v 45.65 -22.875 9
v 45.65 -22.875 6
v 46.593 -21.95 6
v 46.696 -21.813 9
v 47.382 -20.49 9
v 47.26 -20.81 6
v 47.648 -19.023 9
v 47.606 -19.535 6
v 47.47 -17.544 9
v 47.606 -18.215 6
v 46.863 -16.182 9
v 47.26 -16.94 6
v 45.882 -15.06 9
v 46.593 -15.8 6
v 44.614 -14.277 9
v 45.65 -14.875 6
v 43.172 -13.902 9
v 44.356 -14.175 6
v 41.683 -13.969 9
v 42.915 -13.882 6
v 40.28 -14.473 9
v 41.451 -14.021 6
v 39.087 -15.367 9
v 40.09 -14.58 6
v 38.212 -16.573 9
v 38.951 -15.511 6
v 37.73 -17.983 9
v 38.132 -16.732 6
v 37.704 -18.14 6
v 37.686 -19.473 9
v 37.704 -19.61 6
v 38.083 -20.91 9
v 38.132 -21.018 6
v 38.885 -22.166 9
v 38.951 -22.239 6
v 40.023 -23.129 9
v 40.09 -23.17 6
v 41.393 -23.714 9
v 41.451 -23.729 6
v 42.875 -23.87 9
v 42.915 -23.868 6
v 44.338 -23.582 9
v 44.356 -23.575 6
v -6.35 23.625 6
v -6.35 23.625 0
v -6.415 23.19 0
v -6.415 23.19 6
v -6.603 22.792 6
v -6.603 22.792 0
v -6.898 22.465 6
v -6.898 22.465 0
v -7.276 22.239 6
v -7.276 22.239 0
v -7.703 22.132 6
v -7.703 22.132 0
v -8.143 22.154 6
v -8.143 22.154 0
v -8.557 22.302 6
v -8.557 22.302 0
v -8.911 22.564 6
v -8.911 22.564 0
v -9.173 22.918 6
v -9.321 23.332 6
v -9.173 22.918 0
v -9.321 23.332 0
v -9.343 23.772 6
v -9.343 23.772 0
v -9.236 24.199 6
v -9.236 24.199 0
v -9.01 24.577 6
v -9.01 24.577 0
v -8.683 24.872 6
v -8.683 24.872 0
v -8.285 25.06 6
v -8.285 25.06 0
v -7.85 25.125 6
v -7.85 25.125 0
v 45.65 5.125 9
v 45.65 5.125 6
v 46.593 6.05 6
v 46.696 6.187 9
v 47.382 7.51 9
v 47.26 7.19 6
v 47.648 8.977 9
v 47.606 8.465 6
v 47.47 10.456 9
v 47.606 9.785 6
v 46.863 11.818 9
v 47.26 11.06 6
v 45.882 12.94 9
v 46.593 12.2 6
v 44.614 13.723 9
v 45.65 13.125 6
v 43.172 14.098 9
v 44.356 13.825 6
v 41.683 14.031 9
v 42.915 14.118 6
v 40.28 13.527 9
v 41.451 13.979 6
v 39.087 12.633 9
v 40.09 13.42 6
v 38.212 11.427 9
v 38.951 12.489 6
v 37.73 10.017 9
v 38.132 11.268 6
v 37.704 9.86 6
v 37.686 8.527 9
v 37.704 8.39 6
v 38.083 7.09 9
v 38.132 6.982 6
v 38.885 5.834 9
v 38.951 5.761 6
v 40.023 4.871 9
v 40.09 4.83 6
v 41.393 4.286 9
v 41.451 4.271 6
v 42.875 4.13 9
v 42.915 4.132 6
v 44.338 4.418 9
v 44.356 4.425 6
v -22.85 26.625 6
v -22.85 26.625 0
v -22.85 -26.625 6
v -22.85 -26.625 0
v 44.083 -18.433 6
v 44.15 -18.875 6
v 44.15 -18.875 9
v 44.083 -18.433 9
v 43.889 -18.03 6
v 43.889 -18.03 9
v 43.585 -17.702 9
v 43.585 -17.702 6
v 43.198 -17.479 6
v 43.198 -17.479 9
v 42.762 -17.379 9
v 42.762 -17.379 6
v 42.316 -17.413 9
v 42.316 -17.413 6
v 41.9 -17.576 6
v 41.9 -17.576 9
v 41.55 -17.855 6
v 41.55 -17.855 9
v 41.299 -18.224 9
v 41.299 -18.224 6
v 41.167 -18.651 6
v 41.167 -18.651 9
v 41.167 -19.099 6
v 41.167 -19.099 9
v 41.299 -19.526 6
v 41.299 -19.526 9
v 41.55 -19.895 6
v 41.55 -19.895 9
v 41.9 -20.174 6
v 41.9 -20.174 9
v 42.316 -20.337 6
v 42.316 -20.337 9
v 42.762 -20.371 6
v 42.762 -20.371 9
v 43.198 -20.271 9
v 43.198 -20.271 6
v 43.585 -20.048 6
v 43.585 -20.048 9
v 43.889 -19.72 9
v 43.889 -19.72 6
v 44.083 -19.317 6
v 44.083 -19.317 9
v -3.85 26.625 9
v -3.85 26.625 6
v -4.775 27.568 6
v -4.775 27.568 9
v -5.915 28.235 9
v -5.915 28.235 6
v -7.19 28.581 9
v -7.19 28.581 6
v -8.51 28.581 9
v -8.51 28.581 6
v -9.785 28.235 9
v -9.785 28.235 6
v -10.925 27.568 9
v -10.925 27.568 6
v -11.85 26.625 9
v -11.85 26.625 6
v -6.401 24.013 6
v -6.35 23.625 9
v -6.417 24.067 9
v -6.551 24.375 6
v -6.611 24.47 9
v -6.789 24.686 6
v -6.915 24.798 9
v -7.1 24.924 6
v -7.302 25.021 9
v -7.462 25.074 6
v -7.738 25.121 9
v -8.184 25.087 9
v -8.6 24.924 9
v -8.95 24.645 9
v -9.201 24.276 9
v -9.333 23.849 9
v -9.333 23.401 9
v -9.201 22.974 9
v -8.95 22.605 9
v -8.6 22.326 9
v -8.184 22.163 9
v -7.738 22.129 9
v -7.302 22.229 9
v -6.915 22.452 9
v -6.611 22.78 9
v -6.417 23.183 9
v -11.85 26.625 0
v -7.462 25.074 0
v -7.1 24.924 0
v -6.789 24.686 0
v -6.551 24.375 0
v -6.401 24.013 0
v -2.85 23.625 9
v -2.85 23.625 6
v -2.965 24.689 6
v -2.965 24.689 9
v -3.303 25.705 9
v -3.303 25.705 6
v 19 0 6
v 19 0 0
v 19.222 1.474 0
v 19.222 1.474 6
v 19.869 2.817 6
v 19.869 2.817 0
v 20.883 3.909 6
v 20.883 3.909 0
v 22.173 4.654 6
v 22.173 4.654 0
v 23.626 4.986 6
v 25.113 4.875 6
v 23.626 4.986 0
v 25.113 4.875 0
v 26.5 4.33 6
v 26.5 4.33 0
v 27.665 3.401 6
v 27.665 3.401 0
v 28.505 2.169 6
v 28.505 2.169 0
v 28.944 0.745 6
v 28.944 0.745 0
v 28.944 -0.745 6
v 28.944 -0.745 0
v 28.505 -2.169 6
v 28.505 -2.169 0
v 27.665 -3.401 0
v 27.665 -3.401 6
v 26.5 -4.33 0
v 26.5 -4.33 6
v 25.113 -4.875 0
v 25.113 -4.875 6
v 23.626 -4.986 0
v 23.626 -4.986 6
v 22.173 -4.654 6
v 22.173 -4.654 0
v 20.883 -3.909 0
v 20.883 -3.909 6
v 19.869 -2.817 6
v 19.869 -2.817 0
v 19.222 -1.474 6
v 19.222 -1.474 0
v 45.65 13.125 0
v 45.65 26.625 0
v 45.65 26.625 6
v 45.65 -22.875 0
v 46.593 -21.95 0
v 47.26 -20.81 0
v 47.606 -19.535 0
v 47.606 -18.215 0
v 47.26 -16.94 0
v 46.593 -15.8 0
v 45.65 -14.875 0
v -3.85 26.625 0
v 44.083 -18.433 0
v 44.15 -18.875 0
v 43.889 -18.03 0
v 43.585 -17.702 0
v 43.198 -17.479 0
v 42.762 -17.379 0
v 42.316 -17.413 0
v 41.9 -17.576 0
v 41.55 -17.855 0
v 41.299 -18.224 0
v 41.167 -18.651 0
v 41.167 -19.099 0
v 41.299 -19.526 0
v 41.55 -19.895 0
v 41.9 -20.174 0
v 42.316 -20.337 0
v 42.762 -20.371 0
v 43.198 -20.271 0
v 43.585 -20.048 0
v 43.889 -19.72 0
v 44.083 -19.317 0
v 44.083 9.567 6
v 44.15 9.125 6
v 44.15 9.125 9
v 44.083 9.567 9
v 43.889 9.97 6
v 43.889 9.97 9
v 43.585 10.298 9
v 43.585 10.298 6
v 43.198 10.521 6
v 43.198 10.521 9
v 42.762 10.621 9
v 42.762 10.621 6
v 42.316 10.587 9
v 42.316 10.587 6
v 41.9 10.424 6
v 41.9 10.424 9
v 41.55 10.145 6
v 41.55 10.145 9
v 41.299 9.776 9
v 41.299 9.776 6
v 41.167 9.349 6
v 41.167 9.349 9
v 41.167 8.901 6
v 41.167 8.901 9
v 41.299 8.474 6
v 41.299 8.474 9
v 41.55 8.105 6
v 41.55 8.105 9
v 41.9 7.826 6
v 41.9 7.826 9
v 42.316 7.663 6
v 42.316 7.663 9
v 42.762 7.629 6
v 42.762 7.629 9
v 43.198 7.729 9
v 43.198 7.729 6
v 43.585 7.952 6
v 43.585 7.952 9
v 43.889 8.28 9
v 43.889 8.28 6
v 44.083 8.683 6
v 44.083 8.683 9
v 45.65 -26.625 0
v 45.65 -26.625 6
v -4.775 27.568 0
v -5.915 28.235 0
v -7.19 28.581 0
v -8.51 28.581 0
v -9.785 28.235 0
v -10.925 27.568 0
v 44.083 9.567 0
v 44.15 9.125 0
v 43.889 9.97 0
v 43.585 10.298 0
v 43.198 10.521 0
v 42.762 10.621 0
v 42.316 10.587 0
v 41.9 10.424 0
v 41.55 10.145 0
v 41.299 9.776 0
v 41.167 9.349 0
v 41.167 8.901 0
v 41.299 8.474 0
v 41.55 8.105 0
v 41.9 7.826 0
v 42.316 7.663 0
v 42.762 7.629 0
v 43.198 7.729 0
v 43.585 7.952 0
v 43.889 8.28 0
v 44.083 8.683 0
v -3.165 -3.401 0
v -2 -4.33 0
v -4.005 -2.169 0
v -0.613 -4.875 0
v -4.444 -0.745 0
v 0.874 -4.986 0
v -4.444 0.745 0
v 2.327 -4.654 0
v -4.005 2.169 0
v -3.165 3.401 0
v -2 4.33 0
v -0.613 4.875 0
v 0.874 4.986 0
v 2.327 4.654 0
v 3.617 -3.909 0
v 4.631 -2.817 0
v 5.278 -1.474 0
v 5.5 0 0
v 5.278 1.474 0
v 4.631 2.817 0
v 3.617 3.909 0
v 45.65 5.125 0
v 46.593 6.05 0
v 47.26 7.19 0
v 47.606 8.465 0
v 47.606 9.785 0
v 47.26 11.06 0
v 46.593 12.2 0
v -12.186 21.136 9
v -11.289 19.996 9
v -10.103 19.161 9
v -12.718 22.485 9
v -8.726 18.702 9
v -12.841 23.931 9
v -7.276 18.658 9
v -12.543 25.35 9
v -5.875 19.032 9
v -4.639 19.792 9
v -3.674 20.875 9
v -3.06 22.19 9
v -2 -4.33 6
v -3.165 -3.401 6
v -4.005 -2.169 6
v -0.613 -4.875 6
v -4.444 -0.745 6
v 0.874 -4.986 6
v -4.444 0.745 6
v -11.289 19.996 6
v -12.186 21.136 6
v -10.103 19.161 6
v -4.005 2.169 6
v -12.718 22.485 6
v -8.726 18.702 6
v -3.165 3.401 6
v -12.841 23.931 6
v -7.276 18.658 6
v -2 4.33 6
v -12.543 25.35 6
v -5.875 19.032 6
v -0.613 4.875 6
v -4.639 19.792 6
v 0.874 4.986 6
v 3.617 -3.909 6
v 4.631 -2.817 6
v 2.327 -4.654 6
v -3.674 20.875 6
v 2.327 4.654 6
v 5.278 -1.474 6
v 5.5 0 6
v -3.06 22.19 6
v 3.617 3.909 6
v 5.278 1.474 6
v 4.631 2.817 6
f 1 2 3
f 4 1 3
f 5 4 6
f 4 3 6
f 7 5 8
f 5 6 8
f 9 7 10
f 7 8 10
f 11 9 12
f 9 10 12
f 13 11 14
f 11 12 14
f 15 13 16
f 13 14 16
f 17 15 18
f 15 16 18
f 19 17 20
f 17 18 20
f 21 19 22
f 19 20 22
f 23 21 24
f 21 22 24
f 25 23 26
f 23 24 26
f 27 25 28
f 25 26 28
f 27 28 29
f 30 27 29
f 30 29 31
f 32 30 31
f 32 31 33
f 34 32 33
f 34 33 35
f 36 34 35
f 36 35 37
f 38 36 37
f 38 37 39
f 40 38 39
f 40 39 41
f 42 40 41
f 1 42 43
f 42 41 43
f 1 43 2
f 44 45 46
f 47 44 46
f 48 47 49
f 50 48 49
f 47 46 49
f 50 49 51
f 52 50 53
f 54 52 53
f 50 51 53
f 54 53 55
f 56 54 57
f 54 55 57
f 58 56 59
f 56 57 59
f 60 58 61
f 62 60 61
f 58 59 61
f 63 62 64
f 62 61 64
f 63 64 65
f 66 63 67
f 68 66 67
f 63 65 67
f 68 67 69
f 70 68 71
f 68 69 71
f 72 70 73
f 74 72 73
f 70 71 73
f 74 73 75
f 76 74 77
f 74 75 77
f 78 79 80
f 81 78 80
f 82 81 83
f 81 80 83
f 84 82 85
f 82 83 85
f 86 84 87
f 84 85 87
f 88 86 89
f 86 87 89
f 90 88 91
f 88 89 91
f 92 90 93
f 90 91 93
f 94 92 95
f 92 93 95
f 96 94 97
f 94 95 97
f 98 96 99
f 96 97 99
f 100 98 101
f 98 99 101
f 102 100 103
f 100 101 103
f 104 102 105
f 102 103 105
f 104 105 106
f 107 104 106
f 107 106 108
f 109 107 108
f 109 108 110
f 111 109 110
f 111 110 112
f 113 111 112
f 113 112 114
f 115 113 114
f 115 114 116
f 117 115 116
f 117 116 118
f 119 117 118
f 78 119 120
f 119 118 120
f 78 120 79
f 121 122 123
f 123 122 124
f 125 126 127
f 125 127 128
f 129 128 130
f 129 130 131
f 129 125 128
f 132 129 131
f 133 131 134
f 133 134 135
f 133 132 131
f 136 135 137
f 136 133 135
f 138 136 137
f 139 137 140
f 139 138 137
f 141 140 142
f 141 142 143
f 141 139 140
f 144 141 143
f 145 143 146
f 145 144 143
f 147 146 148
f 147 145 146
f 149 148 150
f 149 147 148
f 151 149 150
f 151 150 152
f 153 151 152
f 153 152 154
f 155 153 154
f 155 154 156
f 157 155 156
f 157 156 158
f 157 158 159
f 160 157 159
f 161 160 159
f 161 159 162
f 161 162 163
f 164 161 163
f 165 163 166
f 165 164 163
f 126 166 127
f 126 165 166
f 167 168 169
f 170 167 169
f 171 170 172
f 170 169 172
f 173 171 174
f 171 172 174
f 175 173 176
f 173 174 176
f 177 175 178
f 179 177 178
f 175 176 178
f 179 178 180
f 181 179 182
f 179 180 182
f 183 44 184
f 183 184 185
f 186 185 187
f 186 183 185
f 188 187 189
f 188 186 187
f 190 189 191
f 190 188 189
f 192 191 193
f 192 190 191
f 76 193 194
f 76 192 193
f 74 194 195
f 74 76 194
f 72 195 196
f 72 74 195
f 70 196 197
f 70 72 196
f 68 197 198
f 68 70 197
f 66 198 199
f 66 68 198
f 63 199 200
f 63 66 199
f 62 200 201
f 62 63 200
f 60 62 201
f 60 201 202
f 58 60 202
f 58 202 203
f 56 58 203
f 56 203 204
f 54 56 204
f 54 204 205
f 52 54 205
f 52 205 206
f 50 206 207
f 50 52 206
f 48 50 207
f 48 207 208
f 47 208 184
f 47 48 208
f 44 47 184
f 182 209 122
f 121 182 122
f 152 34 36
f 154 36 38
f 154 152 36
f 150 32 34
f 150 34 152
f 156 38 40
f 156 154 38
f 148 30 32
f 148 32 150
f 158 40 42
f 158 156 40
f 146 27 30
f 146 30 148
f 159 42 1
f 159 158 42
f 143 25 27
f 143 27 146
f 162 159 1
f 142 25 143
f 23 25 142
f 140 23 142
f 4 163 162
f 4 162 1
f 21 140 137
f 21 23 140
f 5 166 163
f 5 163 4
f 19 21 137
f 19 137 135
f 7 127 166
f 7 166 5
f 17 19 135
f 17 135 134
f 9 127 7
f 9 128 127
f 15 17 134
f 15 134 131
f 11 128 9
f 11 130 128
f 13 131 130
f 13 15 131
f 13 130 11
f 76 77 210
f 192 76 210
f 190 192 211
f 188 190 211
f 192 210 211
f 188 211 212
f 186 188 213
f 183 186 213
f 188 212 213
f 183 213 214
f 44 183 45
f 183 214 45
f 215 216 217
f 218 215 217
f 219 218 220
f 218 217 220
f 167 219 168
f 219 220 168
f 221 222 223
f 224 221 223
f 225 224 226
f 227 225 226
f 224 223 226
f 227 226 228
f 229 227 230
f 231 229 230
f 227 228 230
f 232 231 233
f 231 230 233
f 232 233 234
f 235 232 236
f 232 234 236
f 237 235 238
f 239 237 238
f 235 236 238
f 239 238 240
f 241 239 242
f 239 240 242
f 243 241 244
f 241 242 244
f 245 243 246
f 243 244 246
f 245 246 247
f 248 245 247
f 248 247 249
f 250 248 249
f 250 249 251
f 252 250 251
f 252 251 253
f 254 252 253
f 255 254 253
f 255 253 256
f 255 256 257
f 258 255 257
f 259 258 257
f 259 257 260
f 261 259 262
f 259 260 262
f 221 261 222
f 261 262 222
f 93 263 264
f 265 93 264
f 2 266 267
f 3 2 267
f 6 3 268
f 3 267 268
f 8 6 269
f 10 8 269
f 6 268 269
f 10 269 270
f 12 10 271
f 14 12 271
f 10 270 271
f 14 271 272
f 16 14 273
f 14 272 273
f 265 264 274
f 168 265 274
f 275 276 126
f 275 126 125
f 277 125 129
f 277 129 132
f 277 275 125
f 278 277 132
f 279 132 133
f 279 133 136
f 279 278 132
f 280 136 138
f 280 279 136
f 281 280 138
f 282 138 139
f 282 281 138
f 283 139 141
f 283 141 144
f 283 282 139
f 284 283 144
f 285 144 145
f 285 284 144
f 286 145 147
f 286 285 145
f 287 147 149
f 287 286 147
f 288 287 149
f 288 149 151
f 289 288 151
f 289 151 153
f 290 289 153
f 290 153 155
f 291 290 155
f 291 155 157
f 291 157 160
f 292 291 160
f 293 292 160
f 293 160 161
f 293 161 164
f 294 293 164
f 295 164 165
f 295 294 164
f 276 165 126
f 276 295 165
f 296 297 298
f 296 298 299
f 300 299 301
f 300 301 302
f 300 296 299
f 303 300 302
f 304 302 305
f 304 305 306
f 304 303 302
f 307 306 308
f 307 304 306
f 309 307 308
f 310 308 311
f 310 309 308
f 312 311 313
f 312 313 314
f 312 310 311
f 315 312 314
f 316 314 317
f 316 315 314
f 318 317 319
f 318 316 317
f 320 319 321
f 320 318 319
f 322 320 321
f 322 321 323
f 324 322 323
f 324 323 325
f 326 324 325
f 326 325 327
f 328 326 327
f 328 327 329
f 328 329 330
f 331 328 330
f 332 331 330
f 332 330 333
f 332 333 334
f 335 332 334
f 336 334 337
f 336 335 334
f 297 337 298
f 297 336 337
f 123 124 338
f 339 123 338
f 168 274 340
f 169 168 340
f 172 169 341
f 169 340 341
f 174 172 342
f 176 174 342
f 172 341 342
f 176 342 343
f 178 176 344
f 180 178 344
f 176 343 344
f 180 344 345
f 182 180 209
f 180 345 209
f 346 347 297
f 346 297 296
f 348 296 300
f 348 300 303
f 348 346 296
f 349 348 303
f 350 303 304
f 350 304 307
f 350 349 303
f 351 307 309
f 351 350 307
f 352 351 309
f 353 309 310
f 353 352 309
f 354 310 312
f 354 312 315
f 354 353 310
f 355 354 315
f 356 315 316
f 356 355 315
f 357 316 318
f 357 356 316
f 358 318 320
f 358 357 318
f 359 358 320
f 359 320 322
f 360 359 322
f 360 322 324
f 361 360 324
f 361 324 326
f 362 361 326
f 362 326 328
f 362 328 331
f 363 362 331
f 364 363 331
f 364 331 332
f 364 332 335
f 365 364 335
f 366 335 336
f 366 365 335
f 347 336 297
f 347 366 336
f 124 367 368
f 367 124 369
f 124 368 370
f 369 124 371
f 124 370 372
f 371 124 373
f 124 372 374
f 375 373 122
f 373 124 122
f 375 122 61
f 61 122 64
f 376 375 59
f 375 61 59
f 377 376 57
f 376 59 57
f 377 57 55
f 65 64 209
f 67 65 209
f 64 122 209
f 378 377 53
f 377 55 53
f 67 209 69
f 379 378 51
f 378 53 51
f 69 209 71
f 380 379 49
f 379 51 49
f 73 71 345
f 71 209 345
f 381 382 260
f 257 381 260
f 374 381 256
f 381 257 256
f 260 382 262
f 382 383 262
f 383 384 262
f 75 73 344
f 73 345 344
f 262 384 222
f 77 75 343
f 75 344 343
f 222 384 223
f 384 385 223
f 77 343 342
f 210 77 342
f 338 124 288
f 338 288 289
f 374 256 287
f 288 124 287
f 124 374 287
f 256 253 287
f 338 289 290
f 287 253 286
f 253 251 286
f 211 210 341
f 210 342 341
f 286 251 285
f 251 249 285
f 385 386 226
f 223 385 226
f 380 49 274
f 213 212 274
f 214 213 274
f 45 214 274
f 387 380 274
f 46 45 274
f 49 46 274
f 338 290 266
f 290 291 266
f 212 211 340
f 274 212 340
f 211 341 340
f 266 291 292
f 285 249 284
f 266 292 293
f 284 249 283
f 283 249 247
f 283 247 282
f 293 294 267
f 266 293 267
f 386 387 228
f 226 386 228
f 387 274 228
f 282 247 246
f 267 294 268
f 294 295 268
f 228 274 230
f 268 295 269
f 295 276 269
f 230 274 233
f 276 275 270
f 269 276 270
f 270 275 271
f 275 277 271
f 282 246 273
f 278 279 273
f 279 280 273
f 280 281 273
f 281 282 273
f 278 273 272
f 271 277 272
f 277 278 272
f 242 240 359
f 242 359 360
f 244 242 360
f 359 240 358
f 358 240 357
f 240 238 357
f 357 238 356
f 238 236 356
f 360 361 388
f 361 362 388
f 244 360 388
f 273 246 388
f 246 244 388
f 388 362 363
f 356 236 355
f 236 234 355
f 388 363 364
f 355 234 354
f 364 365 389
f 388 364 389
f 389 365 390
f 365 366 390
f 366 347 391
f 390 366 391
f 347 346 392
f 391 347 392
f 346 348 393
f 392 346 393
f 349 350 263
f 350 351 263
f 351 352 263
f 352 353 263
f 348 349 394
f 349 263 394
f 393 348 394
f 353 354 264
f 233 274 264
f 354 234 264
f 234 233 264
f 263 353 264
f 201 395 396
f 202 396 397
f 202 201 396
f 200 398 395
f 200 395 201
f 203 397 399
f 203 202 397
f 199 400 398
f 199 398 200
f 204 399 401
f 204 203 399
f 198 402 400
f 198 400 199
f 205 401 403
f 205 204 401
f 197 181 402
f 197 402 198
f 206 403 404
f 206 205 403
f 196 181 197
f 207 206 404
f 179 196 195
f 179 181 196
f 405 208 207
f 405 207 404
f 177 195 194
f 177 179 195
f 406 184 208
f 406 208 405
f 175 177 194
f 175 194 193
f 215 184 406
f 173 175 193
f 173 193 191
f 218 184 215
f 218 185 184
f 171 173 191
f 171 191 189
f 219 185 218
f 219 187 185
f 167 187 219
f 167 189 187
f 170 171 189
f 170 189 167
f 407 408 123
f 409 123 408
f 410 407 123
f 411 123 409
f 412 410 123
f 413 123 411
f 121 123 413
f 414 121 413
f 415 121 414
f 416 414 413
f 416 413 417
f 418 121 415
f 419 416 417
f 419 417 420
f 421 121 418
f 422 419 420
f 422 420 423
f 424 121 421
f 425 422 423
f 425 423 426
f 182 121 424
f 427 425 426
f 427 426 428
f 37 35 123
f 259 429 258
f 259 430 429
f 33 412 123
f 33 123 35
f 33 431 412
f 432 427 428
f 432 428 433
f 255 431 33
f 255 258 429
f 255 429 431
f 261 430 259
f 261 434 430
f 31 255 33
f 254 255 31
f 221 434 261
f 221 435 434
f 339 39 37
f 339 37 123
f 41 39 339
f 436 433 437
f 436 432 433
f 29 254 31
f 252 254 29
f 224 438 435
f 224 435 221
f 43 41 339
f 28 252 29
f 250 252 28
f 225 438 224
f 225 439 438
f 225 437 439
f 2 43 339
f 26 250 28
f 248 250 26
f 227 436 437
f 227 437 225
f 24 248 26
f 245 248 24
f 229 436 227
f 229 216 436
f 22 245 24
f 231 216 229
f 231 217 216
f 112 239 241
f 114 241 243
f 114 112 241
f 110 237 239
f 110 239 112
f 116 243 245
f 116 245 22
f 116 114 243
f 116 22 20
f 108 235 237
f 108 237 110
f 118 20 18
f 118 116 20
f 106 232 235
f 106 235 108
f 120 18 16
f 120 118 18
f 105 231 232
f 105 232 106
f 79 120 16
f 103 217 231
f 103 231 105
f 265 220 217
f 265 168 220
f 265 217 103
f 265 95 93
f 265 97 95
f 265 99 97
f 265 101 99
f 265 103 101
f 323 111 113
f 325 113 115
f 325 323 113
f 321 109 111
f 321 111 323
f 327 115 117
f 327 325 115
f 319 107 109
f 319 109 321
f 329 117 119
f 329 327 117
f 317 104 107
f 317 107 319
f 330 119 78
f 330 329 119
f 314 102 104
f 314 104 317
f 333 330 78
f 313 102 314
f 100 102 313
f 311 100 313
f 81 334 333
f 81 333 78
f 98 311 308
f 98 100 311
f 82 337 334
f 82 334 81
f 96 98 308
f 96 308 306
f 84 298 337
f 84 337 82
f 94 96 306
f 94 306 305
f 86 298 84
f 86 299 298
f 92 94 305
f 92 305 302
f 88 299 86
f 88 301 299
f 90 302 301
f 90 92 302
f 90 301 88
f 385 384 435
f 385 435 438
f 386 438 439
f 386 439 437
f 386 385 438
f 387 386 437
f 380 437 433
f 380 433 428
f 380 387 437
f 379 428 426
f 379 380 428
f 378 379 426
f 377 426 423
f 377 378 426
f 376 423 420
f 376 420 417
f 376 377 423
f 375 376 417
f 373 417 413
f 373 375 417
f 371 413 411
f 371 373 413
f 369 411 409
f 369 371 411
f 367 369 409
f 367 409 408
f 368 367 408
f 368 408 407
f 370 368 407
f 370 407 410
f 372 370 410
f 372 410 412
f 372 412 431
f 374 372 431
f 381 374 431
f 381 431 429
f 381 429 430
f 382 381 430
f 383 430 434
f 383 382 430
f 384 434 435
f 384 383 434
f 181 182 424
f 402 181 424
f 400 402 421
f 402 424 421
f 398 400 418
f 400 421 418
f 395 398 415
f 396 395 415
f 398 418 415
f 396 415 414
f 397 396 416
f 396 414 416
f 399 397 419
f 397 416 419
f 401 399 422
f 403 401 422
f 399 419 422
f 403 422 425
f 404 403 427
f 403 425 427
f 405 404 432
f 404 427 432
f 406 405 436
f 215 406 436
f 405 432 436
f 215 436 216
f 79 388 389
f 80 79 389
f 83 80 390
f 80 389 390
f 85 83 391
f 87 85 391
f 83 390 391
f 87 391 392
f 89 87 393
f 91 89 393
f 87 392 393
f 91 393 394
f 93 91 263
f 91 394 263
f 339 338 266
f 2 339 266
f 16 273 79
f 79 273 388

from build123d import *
from build123d import SkipClean  # not in build123d's __all__

# Parameters (mm, degrees)
F0_R     = 5
F0_R_2   = 1.5
F1_DEPTH = 6
F2_R     = 1.5
F3_DEPTH = 3


# Not quite as in the source:
# - a feature names something its author has since deleted; it is built from what else it names


with BuildPart() as f1:
    # F0 (on Top) → F1 (new body)
    with BuildSketch(Plane.XY):
        with BuildLine():
            Line((42.65, 26.625), (11.4, 26.625))
            Line((11.4, 26.625), (-3.85, 26.625))
            ThreePointArc((-3.85, 26.625), (-7.85, 28.625), (-11.85, 26.625))
            Line((-11.85, 26.625), (-22.85, 26.625))
            Line((-22.85, 26.625), (-22.85, -26.625))
            Line((-22.85, -26.625), (45.65, -26.625))
            Line((45.65, -26.625), (45.65, -22.875))
            ThreePointArc((45.65, -22.875), (47.65, -18.875), (45.65, -14.875))
            Line((45.65, -14.875), (45.65, 5.125))
            ThreePointArc((45.65, 5.125), (47.65, 9.125), (45.65, 13.125))
            Line((45.65, 13.125), (45.65, 26.625))
            Line((45.65, 26.625), (42.65, 26.625))
        make_face()
        with Locations((0.5, 0)):
            Circle(F0_R, mode=Mode.SUBTRACT)
        with Locations((42.65, -18.875)):
            Circle(F0_R_2, mode=Mode.SUBTRACT)
        with BuildLine():
            ThreePointArc((29, 0), (24, -5), (19, 0))
            ThreePointArc((19, 0), (24, 5), (29, 0))
        make_face(mode=Mode.SUBTRACT)
        with BuildLine():
            ThreePointArc((-7.85, 25.125), (-6.7893398282, 24.6856601718), (-6.35, 23.625))
            ThreePointArc((-6.35, 23.625), (-8.9106601718, 22.5643398282), (-7.85, 25.125))
        make_face(mode=Mode.SUBTRACT)
        with Locations((42.65, 9.125)):
            Circle(F0_R_2, mode=Mode.SUBTRACT)
    extrude(amount=F1_DEPTH)

    # F2 (on face) → F3 (join)
    with BuildSketch(Plane.XY.offset(6)):
        with BuildLine():
            ThreePointArc((-11.85, 26.625), (-9.4311388301, 18.8815835097), (-2.85, 23.625))
            ThreePointArc((-2.85, 23.625), (-3.1065835097, 25.2061388301), (-3.85, 26.625))
            ThreePointArc((-3.85, 26.625), (-7.85, 28.625), (-11.85, 26.625))
        make_face()
        with Locations((-7.85, 23.625)):
            Circle(F2_R, mode=Mode.SUBTRACT)
        with BuildLine():
            ThreePointArc((47.65, 9.125), (47.122135955, 11.3610679775), (45.65, 13.125))
            ThreePointArc((45.65, 13.125), (37.65, 9.125), (45.65, 5.125))
            ThreePointArc((45.65, 5.125), (47.122135955, 6.8889320225), (47.65, 9.125))
        make_face()
        with Locations((42.65, 9.125)):
            Circle(F2_R, mode=Mode.SUBTRACT)
        with BuildLine():
            ThreePointArc((47.65, -18.875), (47.122135955, -16.6389320225), (45.65, -14.875))
            ThreePointArc((45.65, -14.875), (37.65, -18.875), (45.65, -22.875))
            ThreePointArc((45.65, -22.875), (47.122135955, -21.1110679775), (47.65, -18.875))
        make_face()
        with Locations((42.65, -18.875)):
            Circle(F2_R, mode=Mode.SUBTRACT)
    with SkipClean():  # cleaning this boolean's faces spoils the solid; the shape is the same uncleaned
        extrude(amount=F3_DEPTH)


solid = f1.part
